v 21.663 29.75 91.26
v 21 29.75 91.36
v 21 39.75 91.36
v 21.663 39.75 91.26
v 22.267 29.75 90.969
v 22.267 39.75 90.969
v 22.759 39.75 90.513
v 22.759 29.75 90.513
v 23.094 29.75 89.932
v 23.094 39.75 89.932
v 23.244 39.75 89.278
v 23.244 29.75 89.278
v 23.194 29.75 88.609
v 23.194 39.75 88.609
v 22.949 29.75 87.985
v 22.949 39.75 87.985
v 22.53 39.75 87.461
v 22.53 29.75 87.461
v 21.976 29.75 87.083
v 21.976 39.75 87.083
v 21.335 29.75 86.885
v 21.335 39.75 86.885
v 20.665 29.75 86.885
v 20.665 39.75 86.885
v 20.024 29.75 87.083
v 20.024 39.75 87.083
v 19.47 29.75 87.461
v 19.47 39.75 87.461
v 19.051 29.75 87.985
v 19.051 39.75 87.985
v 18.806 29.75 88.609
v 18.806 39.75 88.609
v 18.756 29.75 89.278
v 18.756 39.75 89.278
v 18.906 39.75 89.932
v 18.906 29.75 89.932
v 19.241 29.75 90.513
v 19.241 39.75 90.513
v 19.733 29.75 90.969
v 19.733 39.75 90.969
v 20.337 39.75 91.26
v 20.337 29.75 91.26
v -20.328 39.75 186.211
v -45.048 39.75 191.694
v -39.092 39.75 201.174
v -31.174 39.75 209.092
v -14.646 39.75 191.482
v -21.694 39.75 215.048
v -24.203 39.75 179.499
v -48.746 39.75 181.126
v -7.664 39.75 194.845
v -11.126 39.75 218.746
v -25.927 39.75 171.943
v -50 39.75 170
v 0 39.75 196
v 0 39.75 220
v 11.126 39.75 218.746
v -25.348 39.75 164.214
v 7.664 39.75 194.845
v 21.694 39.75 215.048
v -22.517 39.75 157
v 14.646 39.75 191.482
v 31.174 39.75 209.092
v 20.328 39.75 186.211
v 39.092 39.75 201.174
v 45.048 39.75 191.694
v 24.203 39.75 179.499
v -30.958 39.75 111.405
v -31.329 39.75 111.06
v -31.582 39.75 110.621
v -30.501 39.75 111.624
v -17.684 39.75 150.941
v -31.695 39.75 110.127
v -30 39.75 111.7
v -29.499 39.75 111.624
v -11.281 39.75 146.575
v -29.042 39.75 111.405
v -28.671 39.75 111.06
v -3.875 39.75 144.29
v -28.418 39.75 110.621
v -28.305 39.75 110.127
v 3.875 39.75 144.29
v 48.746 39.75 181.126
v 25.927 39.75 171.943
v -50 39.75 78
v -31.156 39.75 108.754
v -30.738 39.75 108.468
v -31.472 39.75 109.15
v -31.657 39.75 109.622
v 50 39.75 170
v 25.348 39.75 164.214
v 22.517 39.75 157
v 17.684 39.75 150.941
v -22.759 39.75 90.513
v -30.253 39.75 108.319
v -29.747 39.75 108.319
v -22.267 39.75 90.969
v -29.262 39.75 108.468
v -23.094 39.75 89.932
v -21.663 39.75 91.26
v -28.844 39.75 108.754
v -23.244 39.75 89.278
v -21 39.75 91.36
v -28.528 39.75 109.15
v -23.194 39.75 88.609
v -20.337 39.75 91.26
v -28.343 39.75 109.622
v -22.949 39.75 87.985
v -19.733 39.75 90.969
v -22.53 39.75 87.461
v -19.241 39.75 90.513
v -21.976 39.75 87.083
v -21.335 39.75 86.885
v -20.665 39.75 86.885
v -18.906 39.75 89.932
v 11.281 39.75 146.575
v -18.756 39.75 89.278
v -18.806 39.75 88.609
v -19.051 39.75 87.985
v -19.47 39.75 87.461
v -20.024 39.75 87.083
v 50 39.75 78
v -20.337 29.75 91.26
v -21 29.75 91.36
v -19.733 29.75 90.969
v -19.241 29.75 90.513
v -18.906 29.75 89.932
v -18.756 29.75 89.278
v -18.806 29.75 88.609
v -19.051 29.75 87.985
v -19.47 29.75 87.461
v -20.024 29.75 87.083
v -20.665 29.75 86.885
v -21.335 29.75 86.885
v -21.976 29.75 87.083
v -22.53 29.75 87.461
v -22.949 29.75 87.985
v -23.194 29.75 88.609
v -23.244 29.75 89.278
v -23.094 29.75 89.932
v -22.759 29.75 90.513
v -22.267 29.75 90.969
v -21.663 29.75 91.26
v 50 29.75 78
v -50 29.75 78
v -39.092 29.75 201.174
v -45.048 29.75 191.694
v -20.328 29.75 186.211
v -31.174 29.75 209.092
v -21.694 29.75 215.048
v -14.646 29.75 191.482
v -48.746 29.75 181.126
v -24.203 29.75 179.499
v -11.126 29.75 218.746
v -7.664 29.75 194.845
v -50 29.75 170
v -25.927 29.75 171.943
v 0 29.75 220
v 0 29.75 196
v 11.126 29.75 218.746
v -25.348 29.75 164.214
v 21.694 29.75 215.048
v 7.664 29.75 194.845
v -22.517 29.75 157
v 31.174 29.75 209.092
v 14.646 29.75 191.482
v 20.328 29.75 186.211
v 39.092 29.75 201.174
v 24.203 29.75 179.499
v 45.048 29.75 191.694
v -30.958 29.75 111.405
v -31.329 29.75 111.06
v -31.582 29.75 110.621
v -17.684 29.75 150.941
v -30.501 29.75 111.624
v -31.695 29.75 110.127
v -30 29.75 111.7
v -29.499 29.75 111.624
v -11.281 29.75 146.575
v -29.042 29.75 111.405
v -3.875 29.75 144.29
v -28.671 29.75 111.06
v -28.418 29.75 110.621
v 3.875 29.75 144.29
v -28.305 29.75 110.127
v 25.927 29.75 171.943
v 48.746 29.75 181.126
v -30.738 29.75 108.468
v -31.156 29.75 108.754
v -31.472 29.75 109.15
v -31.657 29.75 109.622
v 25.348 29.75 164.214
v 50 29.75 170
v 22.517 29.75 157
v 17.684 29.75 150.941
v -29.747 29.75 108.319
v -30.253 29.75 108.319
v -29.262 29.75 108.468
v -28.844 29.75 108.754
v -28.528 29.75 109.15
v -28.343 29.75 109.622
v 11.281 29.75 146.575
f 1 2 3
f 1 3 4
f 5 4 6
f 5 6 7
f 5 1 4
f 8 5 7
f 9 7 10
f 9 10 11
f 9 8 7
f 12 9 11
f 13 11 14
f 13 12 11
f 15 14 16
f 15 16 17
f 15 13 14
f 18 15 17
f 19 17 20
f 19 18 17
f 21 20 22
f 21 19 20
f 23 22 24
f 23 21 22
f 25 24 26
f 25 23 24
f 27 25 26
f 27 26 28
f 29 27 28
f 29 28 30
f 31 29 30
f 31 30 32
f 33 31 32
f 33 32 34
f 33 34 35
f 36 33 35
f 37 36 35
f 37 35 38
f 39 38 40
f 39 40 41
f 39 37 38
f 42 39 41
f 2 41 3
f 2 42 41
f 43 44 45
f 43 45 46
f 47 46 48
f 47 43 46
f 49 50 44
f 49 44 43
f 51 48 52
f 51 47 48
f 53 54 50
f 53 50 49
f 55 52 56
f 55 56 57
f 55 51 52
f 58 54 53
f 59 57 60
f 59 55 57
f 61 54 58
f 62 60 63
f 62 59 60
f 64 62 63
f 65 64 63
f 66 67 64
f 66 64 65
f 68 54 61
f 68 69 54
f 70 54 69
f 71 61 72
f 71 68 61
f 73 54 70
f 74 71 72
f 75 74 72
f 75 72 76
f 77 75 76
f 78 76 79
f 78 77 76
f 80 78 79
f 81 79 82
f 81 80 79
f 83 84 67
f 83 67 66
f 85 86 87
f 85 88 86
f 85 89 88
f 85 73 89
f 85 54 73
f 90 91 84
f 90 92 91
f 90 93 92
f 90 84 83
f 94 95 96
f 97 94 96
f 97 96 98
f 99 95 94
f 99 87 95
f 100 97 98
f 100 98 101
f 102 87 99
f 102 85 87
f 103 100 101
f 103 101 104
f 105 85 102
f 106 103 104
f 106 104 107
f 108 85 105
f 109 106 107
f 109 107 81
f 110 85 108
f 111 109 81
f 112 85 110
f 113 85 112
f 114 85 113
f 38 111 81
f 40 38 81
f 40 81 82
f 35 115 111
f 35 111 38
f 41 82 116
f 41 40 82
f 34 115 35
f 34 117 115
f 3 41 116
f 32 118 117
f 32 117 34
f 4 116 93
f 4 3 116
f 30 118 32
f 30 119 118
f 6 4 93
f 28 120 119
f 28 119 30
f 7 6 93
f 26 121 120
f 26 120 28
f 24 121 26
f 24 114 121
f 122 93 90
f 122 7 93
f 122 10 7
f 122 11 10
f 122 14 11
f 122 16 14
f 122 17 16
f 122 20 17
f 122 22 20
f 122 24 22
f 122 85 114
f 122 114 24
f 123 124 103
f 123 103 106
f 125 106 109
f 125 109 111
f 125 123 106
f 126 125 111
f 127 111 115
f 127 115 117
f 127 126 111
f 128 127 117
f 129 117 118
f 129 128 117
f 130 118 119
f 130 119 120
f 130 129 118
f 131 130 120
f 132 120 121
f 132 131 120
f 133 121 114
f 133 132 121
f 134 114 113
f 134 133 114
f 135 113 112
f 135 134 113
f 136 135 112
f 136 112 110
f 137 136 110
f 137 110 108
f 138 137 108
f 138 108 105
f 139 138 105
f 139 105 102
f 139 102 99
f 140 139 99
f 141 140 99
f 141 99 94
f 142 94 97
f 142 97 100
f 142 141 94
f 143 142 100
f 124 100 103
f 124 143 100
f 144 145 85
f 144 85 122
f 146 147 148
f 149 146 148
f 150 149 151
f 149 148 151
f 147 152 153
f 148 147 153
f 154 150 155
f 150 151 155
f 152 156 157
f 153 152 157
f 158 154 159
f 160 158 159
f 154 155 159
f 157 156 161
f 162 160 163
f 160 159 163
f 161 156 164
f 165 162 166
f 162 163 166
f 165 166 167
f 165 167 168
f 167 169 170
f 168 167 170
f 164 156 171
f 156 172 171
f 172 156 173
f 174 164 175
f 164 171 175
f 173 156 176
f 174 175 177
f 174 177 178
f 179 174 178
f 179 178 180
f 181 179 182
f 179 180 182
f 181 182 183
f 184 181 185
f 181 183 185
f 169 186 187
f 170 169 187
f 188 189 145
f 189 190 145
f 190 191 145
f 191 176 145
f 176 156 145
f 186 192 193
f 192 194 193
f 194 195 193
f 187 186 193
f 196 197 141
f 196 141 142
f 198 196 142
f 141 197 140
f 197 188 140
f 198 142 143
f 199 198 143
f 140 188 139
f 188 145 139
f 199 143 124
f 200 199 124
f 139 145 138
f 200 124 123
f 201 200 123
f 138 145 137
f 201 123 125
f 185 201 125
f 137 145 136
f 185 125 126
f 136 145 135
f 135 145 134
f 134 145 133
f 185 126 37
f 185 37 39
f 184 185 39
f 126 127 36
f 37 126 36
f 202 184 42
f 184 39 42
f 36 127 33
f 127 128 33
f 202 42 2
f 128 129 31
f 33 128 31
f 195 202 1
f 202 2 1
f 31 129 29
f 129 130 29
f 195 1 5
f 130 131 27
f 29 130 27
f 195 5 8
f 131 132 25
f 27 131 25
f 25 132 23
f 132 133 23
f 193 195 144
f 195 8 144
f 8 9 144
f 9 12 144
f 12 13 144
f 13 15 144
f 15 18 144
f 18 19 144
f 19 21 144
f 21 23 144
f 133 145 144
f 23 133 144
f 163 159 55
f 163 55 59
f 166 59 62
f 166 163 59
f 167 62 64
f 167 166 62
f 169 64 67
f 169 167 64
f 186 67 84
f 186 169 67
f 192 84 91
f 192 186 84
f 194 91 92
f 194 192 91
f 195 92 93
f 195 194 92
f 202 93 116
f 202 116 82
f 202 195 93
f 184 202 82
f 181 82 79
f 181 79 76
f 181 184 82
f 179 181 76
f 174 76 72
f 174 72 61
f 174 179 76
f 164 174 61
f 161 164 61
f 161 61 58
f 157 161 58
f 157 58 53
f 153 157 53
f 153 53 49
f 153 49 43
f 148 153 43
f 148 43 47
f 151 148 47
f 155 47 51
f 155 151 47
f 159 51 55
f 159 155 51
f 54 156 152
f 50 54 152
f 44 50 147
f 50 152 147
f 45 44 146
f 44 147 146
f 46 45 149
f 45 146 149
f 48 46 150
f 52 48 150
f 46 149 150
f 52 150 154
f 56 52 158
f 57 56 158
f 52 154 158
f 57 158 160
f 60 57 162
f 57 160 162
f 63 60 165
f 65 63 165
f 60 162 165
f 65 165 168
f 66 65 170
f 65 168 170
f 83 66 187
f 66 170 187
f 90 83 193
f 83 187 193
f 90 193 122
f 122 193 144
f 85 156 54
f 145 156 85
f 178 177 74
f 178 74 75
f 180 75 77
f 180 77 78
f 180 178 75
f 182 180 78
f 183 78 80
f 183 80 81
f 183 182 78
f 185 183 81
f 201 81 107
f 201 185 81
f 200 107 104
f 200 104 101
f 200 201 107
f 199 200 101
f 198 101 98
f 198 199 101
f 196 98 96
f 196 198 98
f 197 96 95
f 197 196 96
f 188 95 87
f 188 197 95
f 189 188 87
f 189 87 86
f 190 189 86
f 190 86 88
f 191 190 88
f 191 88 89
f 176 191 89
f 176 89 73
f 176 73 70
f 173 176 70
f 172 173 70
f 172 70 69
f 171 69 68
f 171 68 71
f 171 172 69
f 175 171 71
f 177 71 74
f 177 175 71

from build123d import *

# Parameters (mm, degrees)
PARED_START               = 29.75
SK_PARED_W                = 100
SK_PARED_H                = 92
PARED_DEPTH               = 10
CABEZA_START              = 29.75
SK_CABEZA_R               = 50
CABEZA_DEPTH              = 10
PASO_CUBO_J2_START        = 29.75
SK_PASO_CUBO_J2_R         = 26
PASO_CUBO_J2_DEPTH        = 10
PASANTES_M4_ANGULOS_START = 29.75
SK_PASANTES_M4_ANGULOS_R  = 2.25
PASANTES_M4_ANGULOS_DEPTH = 10
PASANTE_M3_CINCHO_START   = 29.75
SK_PASANTE_M3_CINCHO_R    = 1.7
PASANTE_M3_CINCHO_DEPTH   = 10


with BuildPart() as part:
    # Sk_Pared → Pared (new body)
    with BuildSketch(Plane(origin=(0, 0, 0), x_dir=(1, 0, 0), z_dir=(0, 1, 0)).offset(PARED_START)):
        with Locations((0, -124)):
            Rectangle(SK_PARED_W, SK_PARED_H)
    extrude(amount=PARED_DEPTH)

    # Sk_Cabeza → Cabeza (add)
    with BuildSketch(Plane(origin=(0, 0, 0), x_dir=(1, 0, 0), z_dir=(0, 1, 0)).offset(CABEZA_START)):
        with Locations((0, -170)):
            Circle(SK_CABEZA_R)
    extrude(amount=CABEZA_DEPTH)

    # Sk_Paso_cubo_J2 → Paso_cubo_J2 (cut)
    with BuildSketch(Plane(origin=(0, 0, 0), x_dir=(1, 0, 0), z_dir=(0, 1, 0)).offset(PASO_CUBO_J2_START)):
        with Locations(Location((0, -170, 0), (0, 0, 270))):
            Circle(SK_PASO_CUBO_J2_R)
    extrude(amount=PASO_CUBO_J2_DEPTH, mode=Mode.SUBTRACT)

    # Sk_Pasantes_M4_angulos → Pasantes_M4_angulos (cut)
    with BuildSketch(Plane(origin=(0, 0, 0), x_dir=(1, 0, 0), z_dir=(0, 1, 0)).offset(PASANTES_M4_ANGULOS_START)):
        with Locations(Location((-21, -89.11, 0), (0, 0, 270))):
            Circle(SK_PASANTES_M4_ANGULOS_R)
        with Locations(Location((21, -89.11, 0), (0, 0, 270))):
            Circle(SK_PASANTES_M4_ANGULOS_R)
    extrude(amount=PASANTES_M4_ANGULOS_DEPTH, mode=Mode.SUBTRACT)

    # Sk_Pasante_M3_cincho → Pasante_M3_cincho (cut)
    with BuildSketch(Plane(origin=(0, 0, 0), x_dir=(1, 0, 0), z_dir=(0, 1, 0)).offset(PASANTE_M3_CINCHO_START)):
        with Locations(Location((-30, -110, 0), (0, 0, 270))):
            Circle(SK_PASANTE_M3_CINCHO_R)
    extrude(amount=PASANTE_M3_CINCHO_DEPTH, mode=Mode.SUBTRACT)


solid = part.part
